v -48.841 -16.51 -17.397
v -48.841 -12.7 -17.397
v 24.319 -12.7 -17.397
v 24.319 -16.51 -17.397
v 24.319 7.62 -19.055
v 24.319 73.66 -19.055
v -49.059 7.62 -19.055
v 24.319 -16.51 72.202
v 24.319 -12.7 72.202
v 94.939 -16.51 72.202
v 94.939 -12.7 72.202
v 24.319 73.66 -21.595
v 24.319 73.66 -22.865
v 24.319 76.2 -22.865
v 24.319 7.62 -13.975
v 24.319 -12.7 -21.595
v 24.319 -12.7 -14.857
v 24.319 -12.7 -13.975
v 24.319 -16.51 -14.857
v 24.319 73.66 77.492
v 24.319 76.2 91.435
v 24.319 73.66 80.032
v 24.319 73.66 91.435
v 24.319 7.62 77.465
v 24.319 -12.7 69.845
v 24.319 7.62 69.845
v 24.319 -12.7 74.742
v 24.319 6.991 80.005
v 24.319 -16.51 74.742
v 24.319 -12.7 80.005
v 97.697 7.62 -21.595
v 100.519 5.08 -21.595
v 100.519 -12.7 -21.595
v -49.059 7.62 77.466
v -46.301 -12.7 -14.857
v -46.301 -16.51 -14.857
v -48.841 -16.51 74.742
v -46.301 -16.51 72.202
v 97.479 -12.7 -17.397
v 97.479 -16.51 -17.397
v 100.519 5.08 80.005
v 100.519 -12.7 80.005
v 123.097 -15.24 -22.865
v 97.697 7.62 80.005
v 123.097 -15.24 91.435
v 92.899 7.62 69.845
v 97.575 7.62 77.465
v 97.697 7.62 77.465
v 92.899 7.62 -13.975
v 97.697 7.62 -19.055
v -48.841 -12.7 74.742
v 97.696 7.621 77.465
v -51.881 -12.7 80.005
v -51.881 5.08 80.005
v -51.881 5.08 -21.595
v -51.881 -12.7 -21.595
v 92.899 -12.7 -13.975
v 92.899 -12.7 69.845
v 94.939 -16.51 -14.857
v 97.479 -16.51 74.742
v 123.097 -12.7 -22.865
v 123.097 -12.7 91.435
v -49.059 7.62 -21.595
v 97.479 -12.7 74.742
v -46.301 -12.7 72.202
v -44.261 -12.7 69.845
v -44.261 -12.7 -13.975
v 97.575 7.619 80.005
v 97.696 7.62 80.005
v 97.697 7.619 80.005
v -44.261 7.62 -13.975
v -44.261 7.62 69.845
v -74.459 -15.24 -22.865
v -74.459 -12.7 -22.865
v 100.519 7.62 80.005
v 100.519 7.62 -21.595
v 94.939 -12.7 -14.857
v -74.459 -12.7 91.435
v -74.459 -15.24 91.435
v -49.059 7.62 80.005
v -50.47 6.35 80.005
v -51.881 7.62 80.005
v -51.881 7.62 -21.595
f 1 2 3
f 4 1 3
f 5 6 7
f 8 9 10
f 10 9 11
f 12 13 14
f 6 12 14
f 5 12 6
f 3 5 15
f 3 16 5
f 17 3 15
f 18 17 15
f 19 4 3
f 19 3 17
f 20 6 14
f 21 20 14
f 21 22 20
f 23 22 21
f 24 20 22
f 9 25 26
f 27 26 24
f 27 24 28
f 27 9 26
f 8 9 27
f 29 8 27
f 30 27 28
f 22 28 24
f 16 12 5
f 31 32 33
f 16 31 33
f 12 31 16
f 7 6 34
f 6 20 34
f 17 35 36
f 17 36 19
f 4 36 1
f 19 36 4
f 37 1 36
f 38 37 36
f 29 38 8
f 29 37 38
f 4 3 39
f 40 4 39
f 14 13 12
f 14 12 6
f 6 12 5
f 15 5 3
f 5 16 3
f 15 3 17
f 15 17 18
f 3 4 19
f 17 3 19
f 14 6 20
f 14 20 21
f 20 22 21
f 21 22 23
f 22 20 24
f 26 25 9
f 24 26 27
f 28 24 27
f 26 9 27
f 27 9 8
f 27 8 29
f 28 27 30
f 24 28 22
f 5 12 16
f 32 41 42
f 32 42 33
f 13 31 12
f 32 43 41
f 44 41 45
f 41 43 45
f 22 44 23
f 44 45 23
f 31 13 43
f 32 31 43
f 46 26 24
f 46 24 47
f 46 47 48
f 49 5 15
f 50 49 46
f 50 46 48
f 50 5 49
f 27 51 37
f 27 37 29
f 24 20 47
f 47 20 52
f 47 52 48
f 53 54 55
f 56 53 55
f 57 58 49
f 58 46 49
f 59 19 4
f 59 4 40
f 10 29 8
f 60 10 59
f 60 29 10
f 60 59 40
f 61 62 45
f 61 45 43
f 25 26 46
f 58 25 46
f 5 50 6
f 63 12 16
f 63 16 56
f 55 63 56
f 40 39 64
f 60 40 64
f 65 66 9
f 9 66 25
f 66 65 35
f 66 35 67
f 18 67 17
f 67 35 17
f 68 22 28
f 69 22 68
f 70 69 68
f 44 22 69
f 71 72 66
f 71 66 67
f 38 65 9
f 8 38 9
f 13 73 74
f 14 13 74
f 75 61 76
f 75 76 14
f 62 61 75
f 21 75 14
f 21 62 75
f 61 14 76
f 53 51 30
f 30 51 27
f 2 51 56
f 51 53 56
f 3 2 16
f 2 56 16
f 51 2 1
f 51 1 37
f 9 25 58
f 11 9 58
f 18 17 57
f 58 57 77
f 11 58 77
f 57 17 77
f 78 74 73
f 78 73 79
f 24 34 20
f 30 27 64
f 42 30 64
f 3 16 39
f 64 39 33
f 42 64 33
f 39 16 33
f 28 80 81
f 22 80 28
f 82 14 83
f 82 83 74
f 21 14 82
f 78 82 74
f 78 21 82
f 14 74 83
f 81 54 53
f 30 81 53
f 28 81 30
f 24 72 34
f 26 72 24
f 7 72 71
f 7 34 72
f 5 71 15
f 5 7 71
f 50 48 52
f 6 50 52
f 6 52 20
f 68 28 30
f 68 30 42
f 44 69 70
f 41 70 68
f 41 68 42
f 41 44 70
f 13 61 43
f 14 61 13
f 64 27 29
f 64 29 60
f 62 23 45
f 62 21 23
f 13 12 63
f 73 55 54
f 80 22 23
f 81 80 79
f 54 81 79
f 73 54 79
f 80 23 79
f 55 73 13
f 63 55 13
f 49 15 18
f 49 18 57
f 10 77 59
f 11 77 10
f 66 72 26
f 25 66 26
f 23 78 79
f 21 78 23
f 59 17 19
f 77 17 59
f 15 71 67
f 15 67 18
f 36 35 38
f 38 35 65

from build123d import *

# Parameters (mm, degrees)
SKETCH1_W           = 152.4
SKETCH1_H           = 101.6
SKETCH1_W_2         = 137.16
SKETCH1_H_2         = 83.82
BOSS_EXTRUDE1_DEPTH = 7.62
SKETCH1_4_W         = 152.4
SKETCH1_4_H         = 101.6
SKETCH1_4_W_2       = 137.16
SKETCH1_4_H_2       = 83.82
BOSS_EXTRUDE2_DEPTH = 12.7
BOSS_EXTRUDE3_DEPTH = 2.54
BOSS_EXTRUDE4_DEPTH = 2.54
BOSS_EXTRUDE6_START = 77.462262
BOSS_EXTRUDE6_DEPTH = 2.54
SKETCH4_W           = 146.32
SKETCH4_H           = 92.139006
SKETCH4_W_2         = 141.24
SKETCH4_H_2         = 87.059006
BOSS_EXTRUDE7_DEPTH = 3.81
BOSS_EXTRUDE5_DEPTH = 2.54


with BuildPart() as part:
    # Sketch1 → Boss-Extrude1 (new body)
    with BuildSketch(Plane(origin=(0, 0, 0), x_dir=(1, 0, 0), z_dir=(0, 1, 0))):
        with Locations((24.319149, -29.205059)):
            Rectangle(SKETCH1_W, SKETCH1_H)
        with Locations((24.319149, -27.935059)):
            Rectangle(SKETCH1_W_2, SKETCH1_H_2, mode=Mode.SUBTRACT)
    extrude(amount=BOSS_EXTRUDE1_DEPTH)

    # Sketch1<4> → Boss-Extrude2 (add)
    with BuildSketch(Plane(origin=(0, 0, 0), x_dir=(1, 0, 0), z_dir=(0, 1, 0))):
        with Locations((24.319149, -29.205059)):
            Rectangle(SKETCH1_4_W, SKETCH1_4_H)
        with Locations((24.319149, -27.935059)):
            Rectangle(SKETCH1_4_W_2, SKETCH1_4_H_2, mode=Mode.SUBTRACT)
    extrude(amount=-BOSS_EXTRUDE2_DEPTH)

    # 3DSketch1 → Boss-Extrude3 (add, along a direction that is not the sketch's normal)
    with BuildSketch(Plane(origin=(-74.458629, -12.7, 91.435059), x_dir=(0.5635274514996128, 0.5071747063496513, -0.6520817653066956), z_dir=(0.6689647316224498, -0.7432941462471663, 0))):
        Polygon((0, 0), (100.751821, 86.65639), (175.284767, 0), (74.532946, -86.65639), align=None)
    extrude(amount=BOSS_EXTRUDE3_DEPTH, dir=(0, -1, 0))

    # 3DSketch2 → Boss-Extrude4 (add, along a direction that is not the sketch's normal)
    with BuildSketch(Plane(origin=(24.319149, 76.2, 91.435059), x_dir=(0.563527451499613, -0.5071747063496519, -0.6520817653066951), z_dir=(-0.6689647316224497, -0.7432941462471663, 0))):
        Polygon((0, 0), (100.751821, 86.65639), (175.284767, 0), (74.532946, -86.65639), align=None)
    extrude(amount=BOSS_EXTRUDE4_DEPTH, dir=(0, -1, 0))


with BuildPart() as boss_extrude6_tool:
    # Boss-Extrude6: read off the stored shape, not the designer's step
    # Boss-Extrude6 outline → Boss-Extrude6 (new body)
    with BuildSketch(Plane(origin=(0, 0, 0), x_dir=(0.999999999993782, 1.4508726198126203e-09, -3.5264782604969394e-06), z_dir=(3.526478558957771e-06, -0.00041142249854835217, 0.9999999153595424)).offset(BOSS_EXTRUDE6_START)):
        Polygon((97.696645, 7.652915), (24.318867, 73.692921), (-50.470022, 6.382915), (97.574726, 7.65187), (97.696654, 7.65187), (97.695503, 7.652905), align=None)
    extrude(amount=BOSS_EXTRUDE6_DEPTH)


with BuildPart() as part_1:
    add(part.part)


with BuildPart() as part_2:
    # Boss-Extrude6: joined with boss_extrude6_tool
    add(part_1.part.fuse(boss_extrude6_tool.part, tol=0.00001))

    # Sketch4 → Boss-Extrude7 (add)
    with BuildSketch(Plane.XZ.offset(12.7)):
        with Locations((24.319149, 28.672676)):
            Rectangle(SKETCH4_W, SKETCH4_H)
        with Locations((24.319149, 28.672676)):
            Rectangle(SKETCH4_W_2, SKETCH4_H_2, mode=Mode.SUBTRACT)
    extrude(amount=BOSS_EXTRUDE7_DEPTH)

    # 3DSketch6 → Boss-Extrude5 (add)
    with BuildSketch(Plane(origin=(97.696927, 7.62, -21.594941), x_dir=(-1, 0, 0), z_dir=(0, 0, -1))):
        Polygon((0, 0), (146.755556, 0), (73.377778, 66.04), align=None)
    extrude(amount=-BOSS_EXTRUDE5_DEPTH)


with BuildPart() as body_2:
    # Split1: the piece on the far side of the plane
    add(part_2.part)
    split(bisect_by=Plane(origin=(24.319149, 0, 0), x_dir=(0, 0, 1), z_dir=(1, 0, 0)), keep=Keep.BOTTOM)


with BuildPart() as part_3:
    add(part_2.part)

    # Split1
    split(bisect_by=Plane(origin=(24.319149, 0, 0), x_dir=(0, 0, 1), z_dir=(1, 0, 0)), keep=Keep.TOP)


solid = Compound([body_2.part, part_3.part])
